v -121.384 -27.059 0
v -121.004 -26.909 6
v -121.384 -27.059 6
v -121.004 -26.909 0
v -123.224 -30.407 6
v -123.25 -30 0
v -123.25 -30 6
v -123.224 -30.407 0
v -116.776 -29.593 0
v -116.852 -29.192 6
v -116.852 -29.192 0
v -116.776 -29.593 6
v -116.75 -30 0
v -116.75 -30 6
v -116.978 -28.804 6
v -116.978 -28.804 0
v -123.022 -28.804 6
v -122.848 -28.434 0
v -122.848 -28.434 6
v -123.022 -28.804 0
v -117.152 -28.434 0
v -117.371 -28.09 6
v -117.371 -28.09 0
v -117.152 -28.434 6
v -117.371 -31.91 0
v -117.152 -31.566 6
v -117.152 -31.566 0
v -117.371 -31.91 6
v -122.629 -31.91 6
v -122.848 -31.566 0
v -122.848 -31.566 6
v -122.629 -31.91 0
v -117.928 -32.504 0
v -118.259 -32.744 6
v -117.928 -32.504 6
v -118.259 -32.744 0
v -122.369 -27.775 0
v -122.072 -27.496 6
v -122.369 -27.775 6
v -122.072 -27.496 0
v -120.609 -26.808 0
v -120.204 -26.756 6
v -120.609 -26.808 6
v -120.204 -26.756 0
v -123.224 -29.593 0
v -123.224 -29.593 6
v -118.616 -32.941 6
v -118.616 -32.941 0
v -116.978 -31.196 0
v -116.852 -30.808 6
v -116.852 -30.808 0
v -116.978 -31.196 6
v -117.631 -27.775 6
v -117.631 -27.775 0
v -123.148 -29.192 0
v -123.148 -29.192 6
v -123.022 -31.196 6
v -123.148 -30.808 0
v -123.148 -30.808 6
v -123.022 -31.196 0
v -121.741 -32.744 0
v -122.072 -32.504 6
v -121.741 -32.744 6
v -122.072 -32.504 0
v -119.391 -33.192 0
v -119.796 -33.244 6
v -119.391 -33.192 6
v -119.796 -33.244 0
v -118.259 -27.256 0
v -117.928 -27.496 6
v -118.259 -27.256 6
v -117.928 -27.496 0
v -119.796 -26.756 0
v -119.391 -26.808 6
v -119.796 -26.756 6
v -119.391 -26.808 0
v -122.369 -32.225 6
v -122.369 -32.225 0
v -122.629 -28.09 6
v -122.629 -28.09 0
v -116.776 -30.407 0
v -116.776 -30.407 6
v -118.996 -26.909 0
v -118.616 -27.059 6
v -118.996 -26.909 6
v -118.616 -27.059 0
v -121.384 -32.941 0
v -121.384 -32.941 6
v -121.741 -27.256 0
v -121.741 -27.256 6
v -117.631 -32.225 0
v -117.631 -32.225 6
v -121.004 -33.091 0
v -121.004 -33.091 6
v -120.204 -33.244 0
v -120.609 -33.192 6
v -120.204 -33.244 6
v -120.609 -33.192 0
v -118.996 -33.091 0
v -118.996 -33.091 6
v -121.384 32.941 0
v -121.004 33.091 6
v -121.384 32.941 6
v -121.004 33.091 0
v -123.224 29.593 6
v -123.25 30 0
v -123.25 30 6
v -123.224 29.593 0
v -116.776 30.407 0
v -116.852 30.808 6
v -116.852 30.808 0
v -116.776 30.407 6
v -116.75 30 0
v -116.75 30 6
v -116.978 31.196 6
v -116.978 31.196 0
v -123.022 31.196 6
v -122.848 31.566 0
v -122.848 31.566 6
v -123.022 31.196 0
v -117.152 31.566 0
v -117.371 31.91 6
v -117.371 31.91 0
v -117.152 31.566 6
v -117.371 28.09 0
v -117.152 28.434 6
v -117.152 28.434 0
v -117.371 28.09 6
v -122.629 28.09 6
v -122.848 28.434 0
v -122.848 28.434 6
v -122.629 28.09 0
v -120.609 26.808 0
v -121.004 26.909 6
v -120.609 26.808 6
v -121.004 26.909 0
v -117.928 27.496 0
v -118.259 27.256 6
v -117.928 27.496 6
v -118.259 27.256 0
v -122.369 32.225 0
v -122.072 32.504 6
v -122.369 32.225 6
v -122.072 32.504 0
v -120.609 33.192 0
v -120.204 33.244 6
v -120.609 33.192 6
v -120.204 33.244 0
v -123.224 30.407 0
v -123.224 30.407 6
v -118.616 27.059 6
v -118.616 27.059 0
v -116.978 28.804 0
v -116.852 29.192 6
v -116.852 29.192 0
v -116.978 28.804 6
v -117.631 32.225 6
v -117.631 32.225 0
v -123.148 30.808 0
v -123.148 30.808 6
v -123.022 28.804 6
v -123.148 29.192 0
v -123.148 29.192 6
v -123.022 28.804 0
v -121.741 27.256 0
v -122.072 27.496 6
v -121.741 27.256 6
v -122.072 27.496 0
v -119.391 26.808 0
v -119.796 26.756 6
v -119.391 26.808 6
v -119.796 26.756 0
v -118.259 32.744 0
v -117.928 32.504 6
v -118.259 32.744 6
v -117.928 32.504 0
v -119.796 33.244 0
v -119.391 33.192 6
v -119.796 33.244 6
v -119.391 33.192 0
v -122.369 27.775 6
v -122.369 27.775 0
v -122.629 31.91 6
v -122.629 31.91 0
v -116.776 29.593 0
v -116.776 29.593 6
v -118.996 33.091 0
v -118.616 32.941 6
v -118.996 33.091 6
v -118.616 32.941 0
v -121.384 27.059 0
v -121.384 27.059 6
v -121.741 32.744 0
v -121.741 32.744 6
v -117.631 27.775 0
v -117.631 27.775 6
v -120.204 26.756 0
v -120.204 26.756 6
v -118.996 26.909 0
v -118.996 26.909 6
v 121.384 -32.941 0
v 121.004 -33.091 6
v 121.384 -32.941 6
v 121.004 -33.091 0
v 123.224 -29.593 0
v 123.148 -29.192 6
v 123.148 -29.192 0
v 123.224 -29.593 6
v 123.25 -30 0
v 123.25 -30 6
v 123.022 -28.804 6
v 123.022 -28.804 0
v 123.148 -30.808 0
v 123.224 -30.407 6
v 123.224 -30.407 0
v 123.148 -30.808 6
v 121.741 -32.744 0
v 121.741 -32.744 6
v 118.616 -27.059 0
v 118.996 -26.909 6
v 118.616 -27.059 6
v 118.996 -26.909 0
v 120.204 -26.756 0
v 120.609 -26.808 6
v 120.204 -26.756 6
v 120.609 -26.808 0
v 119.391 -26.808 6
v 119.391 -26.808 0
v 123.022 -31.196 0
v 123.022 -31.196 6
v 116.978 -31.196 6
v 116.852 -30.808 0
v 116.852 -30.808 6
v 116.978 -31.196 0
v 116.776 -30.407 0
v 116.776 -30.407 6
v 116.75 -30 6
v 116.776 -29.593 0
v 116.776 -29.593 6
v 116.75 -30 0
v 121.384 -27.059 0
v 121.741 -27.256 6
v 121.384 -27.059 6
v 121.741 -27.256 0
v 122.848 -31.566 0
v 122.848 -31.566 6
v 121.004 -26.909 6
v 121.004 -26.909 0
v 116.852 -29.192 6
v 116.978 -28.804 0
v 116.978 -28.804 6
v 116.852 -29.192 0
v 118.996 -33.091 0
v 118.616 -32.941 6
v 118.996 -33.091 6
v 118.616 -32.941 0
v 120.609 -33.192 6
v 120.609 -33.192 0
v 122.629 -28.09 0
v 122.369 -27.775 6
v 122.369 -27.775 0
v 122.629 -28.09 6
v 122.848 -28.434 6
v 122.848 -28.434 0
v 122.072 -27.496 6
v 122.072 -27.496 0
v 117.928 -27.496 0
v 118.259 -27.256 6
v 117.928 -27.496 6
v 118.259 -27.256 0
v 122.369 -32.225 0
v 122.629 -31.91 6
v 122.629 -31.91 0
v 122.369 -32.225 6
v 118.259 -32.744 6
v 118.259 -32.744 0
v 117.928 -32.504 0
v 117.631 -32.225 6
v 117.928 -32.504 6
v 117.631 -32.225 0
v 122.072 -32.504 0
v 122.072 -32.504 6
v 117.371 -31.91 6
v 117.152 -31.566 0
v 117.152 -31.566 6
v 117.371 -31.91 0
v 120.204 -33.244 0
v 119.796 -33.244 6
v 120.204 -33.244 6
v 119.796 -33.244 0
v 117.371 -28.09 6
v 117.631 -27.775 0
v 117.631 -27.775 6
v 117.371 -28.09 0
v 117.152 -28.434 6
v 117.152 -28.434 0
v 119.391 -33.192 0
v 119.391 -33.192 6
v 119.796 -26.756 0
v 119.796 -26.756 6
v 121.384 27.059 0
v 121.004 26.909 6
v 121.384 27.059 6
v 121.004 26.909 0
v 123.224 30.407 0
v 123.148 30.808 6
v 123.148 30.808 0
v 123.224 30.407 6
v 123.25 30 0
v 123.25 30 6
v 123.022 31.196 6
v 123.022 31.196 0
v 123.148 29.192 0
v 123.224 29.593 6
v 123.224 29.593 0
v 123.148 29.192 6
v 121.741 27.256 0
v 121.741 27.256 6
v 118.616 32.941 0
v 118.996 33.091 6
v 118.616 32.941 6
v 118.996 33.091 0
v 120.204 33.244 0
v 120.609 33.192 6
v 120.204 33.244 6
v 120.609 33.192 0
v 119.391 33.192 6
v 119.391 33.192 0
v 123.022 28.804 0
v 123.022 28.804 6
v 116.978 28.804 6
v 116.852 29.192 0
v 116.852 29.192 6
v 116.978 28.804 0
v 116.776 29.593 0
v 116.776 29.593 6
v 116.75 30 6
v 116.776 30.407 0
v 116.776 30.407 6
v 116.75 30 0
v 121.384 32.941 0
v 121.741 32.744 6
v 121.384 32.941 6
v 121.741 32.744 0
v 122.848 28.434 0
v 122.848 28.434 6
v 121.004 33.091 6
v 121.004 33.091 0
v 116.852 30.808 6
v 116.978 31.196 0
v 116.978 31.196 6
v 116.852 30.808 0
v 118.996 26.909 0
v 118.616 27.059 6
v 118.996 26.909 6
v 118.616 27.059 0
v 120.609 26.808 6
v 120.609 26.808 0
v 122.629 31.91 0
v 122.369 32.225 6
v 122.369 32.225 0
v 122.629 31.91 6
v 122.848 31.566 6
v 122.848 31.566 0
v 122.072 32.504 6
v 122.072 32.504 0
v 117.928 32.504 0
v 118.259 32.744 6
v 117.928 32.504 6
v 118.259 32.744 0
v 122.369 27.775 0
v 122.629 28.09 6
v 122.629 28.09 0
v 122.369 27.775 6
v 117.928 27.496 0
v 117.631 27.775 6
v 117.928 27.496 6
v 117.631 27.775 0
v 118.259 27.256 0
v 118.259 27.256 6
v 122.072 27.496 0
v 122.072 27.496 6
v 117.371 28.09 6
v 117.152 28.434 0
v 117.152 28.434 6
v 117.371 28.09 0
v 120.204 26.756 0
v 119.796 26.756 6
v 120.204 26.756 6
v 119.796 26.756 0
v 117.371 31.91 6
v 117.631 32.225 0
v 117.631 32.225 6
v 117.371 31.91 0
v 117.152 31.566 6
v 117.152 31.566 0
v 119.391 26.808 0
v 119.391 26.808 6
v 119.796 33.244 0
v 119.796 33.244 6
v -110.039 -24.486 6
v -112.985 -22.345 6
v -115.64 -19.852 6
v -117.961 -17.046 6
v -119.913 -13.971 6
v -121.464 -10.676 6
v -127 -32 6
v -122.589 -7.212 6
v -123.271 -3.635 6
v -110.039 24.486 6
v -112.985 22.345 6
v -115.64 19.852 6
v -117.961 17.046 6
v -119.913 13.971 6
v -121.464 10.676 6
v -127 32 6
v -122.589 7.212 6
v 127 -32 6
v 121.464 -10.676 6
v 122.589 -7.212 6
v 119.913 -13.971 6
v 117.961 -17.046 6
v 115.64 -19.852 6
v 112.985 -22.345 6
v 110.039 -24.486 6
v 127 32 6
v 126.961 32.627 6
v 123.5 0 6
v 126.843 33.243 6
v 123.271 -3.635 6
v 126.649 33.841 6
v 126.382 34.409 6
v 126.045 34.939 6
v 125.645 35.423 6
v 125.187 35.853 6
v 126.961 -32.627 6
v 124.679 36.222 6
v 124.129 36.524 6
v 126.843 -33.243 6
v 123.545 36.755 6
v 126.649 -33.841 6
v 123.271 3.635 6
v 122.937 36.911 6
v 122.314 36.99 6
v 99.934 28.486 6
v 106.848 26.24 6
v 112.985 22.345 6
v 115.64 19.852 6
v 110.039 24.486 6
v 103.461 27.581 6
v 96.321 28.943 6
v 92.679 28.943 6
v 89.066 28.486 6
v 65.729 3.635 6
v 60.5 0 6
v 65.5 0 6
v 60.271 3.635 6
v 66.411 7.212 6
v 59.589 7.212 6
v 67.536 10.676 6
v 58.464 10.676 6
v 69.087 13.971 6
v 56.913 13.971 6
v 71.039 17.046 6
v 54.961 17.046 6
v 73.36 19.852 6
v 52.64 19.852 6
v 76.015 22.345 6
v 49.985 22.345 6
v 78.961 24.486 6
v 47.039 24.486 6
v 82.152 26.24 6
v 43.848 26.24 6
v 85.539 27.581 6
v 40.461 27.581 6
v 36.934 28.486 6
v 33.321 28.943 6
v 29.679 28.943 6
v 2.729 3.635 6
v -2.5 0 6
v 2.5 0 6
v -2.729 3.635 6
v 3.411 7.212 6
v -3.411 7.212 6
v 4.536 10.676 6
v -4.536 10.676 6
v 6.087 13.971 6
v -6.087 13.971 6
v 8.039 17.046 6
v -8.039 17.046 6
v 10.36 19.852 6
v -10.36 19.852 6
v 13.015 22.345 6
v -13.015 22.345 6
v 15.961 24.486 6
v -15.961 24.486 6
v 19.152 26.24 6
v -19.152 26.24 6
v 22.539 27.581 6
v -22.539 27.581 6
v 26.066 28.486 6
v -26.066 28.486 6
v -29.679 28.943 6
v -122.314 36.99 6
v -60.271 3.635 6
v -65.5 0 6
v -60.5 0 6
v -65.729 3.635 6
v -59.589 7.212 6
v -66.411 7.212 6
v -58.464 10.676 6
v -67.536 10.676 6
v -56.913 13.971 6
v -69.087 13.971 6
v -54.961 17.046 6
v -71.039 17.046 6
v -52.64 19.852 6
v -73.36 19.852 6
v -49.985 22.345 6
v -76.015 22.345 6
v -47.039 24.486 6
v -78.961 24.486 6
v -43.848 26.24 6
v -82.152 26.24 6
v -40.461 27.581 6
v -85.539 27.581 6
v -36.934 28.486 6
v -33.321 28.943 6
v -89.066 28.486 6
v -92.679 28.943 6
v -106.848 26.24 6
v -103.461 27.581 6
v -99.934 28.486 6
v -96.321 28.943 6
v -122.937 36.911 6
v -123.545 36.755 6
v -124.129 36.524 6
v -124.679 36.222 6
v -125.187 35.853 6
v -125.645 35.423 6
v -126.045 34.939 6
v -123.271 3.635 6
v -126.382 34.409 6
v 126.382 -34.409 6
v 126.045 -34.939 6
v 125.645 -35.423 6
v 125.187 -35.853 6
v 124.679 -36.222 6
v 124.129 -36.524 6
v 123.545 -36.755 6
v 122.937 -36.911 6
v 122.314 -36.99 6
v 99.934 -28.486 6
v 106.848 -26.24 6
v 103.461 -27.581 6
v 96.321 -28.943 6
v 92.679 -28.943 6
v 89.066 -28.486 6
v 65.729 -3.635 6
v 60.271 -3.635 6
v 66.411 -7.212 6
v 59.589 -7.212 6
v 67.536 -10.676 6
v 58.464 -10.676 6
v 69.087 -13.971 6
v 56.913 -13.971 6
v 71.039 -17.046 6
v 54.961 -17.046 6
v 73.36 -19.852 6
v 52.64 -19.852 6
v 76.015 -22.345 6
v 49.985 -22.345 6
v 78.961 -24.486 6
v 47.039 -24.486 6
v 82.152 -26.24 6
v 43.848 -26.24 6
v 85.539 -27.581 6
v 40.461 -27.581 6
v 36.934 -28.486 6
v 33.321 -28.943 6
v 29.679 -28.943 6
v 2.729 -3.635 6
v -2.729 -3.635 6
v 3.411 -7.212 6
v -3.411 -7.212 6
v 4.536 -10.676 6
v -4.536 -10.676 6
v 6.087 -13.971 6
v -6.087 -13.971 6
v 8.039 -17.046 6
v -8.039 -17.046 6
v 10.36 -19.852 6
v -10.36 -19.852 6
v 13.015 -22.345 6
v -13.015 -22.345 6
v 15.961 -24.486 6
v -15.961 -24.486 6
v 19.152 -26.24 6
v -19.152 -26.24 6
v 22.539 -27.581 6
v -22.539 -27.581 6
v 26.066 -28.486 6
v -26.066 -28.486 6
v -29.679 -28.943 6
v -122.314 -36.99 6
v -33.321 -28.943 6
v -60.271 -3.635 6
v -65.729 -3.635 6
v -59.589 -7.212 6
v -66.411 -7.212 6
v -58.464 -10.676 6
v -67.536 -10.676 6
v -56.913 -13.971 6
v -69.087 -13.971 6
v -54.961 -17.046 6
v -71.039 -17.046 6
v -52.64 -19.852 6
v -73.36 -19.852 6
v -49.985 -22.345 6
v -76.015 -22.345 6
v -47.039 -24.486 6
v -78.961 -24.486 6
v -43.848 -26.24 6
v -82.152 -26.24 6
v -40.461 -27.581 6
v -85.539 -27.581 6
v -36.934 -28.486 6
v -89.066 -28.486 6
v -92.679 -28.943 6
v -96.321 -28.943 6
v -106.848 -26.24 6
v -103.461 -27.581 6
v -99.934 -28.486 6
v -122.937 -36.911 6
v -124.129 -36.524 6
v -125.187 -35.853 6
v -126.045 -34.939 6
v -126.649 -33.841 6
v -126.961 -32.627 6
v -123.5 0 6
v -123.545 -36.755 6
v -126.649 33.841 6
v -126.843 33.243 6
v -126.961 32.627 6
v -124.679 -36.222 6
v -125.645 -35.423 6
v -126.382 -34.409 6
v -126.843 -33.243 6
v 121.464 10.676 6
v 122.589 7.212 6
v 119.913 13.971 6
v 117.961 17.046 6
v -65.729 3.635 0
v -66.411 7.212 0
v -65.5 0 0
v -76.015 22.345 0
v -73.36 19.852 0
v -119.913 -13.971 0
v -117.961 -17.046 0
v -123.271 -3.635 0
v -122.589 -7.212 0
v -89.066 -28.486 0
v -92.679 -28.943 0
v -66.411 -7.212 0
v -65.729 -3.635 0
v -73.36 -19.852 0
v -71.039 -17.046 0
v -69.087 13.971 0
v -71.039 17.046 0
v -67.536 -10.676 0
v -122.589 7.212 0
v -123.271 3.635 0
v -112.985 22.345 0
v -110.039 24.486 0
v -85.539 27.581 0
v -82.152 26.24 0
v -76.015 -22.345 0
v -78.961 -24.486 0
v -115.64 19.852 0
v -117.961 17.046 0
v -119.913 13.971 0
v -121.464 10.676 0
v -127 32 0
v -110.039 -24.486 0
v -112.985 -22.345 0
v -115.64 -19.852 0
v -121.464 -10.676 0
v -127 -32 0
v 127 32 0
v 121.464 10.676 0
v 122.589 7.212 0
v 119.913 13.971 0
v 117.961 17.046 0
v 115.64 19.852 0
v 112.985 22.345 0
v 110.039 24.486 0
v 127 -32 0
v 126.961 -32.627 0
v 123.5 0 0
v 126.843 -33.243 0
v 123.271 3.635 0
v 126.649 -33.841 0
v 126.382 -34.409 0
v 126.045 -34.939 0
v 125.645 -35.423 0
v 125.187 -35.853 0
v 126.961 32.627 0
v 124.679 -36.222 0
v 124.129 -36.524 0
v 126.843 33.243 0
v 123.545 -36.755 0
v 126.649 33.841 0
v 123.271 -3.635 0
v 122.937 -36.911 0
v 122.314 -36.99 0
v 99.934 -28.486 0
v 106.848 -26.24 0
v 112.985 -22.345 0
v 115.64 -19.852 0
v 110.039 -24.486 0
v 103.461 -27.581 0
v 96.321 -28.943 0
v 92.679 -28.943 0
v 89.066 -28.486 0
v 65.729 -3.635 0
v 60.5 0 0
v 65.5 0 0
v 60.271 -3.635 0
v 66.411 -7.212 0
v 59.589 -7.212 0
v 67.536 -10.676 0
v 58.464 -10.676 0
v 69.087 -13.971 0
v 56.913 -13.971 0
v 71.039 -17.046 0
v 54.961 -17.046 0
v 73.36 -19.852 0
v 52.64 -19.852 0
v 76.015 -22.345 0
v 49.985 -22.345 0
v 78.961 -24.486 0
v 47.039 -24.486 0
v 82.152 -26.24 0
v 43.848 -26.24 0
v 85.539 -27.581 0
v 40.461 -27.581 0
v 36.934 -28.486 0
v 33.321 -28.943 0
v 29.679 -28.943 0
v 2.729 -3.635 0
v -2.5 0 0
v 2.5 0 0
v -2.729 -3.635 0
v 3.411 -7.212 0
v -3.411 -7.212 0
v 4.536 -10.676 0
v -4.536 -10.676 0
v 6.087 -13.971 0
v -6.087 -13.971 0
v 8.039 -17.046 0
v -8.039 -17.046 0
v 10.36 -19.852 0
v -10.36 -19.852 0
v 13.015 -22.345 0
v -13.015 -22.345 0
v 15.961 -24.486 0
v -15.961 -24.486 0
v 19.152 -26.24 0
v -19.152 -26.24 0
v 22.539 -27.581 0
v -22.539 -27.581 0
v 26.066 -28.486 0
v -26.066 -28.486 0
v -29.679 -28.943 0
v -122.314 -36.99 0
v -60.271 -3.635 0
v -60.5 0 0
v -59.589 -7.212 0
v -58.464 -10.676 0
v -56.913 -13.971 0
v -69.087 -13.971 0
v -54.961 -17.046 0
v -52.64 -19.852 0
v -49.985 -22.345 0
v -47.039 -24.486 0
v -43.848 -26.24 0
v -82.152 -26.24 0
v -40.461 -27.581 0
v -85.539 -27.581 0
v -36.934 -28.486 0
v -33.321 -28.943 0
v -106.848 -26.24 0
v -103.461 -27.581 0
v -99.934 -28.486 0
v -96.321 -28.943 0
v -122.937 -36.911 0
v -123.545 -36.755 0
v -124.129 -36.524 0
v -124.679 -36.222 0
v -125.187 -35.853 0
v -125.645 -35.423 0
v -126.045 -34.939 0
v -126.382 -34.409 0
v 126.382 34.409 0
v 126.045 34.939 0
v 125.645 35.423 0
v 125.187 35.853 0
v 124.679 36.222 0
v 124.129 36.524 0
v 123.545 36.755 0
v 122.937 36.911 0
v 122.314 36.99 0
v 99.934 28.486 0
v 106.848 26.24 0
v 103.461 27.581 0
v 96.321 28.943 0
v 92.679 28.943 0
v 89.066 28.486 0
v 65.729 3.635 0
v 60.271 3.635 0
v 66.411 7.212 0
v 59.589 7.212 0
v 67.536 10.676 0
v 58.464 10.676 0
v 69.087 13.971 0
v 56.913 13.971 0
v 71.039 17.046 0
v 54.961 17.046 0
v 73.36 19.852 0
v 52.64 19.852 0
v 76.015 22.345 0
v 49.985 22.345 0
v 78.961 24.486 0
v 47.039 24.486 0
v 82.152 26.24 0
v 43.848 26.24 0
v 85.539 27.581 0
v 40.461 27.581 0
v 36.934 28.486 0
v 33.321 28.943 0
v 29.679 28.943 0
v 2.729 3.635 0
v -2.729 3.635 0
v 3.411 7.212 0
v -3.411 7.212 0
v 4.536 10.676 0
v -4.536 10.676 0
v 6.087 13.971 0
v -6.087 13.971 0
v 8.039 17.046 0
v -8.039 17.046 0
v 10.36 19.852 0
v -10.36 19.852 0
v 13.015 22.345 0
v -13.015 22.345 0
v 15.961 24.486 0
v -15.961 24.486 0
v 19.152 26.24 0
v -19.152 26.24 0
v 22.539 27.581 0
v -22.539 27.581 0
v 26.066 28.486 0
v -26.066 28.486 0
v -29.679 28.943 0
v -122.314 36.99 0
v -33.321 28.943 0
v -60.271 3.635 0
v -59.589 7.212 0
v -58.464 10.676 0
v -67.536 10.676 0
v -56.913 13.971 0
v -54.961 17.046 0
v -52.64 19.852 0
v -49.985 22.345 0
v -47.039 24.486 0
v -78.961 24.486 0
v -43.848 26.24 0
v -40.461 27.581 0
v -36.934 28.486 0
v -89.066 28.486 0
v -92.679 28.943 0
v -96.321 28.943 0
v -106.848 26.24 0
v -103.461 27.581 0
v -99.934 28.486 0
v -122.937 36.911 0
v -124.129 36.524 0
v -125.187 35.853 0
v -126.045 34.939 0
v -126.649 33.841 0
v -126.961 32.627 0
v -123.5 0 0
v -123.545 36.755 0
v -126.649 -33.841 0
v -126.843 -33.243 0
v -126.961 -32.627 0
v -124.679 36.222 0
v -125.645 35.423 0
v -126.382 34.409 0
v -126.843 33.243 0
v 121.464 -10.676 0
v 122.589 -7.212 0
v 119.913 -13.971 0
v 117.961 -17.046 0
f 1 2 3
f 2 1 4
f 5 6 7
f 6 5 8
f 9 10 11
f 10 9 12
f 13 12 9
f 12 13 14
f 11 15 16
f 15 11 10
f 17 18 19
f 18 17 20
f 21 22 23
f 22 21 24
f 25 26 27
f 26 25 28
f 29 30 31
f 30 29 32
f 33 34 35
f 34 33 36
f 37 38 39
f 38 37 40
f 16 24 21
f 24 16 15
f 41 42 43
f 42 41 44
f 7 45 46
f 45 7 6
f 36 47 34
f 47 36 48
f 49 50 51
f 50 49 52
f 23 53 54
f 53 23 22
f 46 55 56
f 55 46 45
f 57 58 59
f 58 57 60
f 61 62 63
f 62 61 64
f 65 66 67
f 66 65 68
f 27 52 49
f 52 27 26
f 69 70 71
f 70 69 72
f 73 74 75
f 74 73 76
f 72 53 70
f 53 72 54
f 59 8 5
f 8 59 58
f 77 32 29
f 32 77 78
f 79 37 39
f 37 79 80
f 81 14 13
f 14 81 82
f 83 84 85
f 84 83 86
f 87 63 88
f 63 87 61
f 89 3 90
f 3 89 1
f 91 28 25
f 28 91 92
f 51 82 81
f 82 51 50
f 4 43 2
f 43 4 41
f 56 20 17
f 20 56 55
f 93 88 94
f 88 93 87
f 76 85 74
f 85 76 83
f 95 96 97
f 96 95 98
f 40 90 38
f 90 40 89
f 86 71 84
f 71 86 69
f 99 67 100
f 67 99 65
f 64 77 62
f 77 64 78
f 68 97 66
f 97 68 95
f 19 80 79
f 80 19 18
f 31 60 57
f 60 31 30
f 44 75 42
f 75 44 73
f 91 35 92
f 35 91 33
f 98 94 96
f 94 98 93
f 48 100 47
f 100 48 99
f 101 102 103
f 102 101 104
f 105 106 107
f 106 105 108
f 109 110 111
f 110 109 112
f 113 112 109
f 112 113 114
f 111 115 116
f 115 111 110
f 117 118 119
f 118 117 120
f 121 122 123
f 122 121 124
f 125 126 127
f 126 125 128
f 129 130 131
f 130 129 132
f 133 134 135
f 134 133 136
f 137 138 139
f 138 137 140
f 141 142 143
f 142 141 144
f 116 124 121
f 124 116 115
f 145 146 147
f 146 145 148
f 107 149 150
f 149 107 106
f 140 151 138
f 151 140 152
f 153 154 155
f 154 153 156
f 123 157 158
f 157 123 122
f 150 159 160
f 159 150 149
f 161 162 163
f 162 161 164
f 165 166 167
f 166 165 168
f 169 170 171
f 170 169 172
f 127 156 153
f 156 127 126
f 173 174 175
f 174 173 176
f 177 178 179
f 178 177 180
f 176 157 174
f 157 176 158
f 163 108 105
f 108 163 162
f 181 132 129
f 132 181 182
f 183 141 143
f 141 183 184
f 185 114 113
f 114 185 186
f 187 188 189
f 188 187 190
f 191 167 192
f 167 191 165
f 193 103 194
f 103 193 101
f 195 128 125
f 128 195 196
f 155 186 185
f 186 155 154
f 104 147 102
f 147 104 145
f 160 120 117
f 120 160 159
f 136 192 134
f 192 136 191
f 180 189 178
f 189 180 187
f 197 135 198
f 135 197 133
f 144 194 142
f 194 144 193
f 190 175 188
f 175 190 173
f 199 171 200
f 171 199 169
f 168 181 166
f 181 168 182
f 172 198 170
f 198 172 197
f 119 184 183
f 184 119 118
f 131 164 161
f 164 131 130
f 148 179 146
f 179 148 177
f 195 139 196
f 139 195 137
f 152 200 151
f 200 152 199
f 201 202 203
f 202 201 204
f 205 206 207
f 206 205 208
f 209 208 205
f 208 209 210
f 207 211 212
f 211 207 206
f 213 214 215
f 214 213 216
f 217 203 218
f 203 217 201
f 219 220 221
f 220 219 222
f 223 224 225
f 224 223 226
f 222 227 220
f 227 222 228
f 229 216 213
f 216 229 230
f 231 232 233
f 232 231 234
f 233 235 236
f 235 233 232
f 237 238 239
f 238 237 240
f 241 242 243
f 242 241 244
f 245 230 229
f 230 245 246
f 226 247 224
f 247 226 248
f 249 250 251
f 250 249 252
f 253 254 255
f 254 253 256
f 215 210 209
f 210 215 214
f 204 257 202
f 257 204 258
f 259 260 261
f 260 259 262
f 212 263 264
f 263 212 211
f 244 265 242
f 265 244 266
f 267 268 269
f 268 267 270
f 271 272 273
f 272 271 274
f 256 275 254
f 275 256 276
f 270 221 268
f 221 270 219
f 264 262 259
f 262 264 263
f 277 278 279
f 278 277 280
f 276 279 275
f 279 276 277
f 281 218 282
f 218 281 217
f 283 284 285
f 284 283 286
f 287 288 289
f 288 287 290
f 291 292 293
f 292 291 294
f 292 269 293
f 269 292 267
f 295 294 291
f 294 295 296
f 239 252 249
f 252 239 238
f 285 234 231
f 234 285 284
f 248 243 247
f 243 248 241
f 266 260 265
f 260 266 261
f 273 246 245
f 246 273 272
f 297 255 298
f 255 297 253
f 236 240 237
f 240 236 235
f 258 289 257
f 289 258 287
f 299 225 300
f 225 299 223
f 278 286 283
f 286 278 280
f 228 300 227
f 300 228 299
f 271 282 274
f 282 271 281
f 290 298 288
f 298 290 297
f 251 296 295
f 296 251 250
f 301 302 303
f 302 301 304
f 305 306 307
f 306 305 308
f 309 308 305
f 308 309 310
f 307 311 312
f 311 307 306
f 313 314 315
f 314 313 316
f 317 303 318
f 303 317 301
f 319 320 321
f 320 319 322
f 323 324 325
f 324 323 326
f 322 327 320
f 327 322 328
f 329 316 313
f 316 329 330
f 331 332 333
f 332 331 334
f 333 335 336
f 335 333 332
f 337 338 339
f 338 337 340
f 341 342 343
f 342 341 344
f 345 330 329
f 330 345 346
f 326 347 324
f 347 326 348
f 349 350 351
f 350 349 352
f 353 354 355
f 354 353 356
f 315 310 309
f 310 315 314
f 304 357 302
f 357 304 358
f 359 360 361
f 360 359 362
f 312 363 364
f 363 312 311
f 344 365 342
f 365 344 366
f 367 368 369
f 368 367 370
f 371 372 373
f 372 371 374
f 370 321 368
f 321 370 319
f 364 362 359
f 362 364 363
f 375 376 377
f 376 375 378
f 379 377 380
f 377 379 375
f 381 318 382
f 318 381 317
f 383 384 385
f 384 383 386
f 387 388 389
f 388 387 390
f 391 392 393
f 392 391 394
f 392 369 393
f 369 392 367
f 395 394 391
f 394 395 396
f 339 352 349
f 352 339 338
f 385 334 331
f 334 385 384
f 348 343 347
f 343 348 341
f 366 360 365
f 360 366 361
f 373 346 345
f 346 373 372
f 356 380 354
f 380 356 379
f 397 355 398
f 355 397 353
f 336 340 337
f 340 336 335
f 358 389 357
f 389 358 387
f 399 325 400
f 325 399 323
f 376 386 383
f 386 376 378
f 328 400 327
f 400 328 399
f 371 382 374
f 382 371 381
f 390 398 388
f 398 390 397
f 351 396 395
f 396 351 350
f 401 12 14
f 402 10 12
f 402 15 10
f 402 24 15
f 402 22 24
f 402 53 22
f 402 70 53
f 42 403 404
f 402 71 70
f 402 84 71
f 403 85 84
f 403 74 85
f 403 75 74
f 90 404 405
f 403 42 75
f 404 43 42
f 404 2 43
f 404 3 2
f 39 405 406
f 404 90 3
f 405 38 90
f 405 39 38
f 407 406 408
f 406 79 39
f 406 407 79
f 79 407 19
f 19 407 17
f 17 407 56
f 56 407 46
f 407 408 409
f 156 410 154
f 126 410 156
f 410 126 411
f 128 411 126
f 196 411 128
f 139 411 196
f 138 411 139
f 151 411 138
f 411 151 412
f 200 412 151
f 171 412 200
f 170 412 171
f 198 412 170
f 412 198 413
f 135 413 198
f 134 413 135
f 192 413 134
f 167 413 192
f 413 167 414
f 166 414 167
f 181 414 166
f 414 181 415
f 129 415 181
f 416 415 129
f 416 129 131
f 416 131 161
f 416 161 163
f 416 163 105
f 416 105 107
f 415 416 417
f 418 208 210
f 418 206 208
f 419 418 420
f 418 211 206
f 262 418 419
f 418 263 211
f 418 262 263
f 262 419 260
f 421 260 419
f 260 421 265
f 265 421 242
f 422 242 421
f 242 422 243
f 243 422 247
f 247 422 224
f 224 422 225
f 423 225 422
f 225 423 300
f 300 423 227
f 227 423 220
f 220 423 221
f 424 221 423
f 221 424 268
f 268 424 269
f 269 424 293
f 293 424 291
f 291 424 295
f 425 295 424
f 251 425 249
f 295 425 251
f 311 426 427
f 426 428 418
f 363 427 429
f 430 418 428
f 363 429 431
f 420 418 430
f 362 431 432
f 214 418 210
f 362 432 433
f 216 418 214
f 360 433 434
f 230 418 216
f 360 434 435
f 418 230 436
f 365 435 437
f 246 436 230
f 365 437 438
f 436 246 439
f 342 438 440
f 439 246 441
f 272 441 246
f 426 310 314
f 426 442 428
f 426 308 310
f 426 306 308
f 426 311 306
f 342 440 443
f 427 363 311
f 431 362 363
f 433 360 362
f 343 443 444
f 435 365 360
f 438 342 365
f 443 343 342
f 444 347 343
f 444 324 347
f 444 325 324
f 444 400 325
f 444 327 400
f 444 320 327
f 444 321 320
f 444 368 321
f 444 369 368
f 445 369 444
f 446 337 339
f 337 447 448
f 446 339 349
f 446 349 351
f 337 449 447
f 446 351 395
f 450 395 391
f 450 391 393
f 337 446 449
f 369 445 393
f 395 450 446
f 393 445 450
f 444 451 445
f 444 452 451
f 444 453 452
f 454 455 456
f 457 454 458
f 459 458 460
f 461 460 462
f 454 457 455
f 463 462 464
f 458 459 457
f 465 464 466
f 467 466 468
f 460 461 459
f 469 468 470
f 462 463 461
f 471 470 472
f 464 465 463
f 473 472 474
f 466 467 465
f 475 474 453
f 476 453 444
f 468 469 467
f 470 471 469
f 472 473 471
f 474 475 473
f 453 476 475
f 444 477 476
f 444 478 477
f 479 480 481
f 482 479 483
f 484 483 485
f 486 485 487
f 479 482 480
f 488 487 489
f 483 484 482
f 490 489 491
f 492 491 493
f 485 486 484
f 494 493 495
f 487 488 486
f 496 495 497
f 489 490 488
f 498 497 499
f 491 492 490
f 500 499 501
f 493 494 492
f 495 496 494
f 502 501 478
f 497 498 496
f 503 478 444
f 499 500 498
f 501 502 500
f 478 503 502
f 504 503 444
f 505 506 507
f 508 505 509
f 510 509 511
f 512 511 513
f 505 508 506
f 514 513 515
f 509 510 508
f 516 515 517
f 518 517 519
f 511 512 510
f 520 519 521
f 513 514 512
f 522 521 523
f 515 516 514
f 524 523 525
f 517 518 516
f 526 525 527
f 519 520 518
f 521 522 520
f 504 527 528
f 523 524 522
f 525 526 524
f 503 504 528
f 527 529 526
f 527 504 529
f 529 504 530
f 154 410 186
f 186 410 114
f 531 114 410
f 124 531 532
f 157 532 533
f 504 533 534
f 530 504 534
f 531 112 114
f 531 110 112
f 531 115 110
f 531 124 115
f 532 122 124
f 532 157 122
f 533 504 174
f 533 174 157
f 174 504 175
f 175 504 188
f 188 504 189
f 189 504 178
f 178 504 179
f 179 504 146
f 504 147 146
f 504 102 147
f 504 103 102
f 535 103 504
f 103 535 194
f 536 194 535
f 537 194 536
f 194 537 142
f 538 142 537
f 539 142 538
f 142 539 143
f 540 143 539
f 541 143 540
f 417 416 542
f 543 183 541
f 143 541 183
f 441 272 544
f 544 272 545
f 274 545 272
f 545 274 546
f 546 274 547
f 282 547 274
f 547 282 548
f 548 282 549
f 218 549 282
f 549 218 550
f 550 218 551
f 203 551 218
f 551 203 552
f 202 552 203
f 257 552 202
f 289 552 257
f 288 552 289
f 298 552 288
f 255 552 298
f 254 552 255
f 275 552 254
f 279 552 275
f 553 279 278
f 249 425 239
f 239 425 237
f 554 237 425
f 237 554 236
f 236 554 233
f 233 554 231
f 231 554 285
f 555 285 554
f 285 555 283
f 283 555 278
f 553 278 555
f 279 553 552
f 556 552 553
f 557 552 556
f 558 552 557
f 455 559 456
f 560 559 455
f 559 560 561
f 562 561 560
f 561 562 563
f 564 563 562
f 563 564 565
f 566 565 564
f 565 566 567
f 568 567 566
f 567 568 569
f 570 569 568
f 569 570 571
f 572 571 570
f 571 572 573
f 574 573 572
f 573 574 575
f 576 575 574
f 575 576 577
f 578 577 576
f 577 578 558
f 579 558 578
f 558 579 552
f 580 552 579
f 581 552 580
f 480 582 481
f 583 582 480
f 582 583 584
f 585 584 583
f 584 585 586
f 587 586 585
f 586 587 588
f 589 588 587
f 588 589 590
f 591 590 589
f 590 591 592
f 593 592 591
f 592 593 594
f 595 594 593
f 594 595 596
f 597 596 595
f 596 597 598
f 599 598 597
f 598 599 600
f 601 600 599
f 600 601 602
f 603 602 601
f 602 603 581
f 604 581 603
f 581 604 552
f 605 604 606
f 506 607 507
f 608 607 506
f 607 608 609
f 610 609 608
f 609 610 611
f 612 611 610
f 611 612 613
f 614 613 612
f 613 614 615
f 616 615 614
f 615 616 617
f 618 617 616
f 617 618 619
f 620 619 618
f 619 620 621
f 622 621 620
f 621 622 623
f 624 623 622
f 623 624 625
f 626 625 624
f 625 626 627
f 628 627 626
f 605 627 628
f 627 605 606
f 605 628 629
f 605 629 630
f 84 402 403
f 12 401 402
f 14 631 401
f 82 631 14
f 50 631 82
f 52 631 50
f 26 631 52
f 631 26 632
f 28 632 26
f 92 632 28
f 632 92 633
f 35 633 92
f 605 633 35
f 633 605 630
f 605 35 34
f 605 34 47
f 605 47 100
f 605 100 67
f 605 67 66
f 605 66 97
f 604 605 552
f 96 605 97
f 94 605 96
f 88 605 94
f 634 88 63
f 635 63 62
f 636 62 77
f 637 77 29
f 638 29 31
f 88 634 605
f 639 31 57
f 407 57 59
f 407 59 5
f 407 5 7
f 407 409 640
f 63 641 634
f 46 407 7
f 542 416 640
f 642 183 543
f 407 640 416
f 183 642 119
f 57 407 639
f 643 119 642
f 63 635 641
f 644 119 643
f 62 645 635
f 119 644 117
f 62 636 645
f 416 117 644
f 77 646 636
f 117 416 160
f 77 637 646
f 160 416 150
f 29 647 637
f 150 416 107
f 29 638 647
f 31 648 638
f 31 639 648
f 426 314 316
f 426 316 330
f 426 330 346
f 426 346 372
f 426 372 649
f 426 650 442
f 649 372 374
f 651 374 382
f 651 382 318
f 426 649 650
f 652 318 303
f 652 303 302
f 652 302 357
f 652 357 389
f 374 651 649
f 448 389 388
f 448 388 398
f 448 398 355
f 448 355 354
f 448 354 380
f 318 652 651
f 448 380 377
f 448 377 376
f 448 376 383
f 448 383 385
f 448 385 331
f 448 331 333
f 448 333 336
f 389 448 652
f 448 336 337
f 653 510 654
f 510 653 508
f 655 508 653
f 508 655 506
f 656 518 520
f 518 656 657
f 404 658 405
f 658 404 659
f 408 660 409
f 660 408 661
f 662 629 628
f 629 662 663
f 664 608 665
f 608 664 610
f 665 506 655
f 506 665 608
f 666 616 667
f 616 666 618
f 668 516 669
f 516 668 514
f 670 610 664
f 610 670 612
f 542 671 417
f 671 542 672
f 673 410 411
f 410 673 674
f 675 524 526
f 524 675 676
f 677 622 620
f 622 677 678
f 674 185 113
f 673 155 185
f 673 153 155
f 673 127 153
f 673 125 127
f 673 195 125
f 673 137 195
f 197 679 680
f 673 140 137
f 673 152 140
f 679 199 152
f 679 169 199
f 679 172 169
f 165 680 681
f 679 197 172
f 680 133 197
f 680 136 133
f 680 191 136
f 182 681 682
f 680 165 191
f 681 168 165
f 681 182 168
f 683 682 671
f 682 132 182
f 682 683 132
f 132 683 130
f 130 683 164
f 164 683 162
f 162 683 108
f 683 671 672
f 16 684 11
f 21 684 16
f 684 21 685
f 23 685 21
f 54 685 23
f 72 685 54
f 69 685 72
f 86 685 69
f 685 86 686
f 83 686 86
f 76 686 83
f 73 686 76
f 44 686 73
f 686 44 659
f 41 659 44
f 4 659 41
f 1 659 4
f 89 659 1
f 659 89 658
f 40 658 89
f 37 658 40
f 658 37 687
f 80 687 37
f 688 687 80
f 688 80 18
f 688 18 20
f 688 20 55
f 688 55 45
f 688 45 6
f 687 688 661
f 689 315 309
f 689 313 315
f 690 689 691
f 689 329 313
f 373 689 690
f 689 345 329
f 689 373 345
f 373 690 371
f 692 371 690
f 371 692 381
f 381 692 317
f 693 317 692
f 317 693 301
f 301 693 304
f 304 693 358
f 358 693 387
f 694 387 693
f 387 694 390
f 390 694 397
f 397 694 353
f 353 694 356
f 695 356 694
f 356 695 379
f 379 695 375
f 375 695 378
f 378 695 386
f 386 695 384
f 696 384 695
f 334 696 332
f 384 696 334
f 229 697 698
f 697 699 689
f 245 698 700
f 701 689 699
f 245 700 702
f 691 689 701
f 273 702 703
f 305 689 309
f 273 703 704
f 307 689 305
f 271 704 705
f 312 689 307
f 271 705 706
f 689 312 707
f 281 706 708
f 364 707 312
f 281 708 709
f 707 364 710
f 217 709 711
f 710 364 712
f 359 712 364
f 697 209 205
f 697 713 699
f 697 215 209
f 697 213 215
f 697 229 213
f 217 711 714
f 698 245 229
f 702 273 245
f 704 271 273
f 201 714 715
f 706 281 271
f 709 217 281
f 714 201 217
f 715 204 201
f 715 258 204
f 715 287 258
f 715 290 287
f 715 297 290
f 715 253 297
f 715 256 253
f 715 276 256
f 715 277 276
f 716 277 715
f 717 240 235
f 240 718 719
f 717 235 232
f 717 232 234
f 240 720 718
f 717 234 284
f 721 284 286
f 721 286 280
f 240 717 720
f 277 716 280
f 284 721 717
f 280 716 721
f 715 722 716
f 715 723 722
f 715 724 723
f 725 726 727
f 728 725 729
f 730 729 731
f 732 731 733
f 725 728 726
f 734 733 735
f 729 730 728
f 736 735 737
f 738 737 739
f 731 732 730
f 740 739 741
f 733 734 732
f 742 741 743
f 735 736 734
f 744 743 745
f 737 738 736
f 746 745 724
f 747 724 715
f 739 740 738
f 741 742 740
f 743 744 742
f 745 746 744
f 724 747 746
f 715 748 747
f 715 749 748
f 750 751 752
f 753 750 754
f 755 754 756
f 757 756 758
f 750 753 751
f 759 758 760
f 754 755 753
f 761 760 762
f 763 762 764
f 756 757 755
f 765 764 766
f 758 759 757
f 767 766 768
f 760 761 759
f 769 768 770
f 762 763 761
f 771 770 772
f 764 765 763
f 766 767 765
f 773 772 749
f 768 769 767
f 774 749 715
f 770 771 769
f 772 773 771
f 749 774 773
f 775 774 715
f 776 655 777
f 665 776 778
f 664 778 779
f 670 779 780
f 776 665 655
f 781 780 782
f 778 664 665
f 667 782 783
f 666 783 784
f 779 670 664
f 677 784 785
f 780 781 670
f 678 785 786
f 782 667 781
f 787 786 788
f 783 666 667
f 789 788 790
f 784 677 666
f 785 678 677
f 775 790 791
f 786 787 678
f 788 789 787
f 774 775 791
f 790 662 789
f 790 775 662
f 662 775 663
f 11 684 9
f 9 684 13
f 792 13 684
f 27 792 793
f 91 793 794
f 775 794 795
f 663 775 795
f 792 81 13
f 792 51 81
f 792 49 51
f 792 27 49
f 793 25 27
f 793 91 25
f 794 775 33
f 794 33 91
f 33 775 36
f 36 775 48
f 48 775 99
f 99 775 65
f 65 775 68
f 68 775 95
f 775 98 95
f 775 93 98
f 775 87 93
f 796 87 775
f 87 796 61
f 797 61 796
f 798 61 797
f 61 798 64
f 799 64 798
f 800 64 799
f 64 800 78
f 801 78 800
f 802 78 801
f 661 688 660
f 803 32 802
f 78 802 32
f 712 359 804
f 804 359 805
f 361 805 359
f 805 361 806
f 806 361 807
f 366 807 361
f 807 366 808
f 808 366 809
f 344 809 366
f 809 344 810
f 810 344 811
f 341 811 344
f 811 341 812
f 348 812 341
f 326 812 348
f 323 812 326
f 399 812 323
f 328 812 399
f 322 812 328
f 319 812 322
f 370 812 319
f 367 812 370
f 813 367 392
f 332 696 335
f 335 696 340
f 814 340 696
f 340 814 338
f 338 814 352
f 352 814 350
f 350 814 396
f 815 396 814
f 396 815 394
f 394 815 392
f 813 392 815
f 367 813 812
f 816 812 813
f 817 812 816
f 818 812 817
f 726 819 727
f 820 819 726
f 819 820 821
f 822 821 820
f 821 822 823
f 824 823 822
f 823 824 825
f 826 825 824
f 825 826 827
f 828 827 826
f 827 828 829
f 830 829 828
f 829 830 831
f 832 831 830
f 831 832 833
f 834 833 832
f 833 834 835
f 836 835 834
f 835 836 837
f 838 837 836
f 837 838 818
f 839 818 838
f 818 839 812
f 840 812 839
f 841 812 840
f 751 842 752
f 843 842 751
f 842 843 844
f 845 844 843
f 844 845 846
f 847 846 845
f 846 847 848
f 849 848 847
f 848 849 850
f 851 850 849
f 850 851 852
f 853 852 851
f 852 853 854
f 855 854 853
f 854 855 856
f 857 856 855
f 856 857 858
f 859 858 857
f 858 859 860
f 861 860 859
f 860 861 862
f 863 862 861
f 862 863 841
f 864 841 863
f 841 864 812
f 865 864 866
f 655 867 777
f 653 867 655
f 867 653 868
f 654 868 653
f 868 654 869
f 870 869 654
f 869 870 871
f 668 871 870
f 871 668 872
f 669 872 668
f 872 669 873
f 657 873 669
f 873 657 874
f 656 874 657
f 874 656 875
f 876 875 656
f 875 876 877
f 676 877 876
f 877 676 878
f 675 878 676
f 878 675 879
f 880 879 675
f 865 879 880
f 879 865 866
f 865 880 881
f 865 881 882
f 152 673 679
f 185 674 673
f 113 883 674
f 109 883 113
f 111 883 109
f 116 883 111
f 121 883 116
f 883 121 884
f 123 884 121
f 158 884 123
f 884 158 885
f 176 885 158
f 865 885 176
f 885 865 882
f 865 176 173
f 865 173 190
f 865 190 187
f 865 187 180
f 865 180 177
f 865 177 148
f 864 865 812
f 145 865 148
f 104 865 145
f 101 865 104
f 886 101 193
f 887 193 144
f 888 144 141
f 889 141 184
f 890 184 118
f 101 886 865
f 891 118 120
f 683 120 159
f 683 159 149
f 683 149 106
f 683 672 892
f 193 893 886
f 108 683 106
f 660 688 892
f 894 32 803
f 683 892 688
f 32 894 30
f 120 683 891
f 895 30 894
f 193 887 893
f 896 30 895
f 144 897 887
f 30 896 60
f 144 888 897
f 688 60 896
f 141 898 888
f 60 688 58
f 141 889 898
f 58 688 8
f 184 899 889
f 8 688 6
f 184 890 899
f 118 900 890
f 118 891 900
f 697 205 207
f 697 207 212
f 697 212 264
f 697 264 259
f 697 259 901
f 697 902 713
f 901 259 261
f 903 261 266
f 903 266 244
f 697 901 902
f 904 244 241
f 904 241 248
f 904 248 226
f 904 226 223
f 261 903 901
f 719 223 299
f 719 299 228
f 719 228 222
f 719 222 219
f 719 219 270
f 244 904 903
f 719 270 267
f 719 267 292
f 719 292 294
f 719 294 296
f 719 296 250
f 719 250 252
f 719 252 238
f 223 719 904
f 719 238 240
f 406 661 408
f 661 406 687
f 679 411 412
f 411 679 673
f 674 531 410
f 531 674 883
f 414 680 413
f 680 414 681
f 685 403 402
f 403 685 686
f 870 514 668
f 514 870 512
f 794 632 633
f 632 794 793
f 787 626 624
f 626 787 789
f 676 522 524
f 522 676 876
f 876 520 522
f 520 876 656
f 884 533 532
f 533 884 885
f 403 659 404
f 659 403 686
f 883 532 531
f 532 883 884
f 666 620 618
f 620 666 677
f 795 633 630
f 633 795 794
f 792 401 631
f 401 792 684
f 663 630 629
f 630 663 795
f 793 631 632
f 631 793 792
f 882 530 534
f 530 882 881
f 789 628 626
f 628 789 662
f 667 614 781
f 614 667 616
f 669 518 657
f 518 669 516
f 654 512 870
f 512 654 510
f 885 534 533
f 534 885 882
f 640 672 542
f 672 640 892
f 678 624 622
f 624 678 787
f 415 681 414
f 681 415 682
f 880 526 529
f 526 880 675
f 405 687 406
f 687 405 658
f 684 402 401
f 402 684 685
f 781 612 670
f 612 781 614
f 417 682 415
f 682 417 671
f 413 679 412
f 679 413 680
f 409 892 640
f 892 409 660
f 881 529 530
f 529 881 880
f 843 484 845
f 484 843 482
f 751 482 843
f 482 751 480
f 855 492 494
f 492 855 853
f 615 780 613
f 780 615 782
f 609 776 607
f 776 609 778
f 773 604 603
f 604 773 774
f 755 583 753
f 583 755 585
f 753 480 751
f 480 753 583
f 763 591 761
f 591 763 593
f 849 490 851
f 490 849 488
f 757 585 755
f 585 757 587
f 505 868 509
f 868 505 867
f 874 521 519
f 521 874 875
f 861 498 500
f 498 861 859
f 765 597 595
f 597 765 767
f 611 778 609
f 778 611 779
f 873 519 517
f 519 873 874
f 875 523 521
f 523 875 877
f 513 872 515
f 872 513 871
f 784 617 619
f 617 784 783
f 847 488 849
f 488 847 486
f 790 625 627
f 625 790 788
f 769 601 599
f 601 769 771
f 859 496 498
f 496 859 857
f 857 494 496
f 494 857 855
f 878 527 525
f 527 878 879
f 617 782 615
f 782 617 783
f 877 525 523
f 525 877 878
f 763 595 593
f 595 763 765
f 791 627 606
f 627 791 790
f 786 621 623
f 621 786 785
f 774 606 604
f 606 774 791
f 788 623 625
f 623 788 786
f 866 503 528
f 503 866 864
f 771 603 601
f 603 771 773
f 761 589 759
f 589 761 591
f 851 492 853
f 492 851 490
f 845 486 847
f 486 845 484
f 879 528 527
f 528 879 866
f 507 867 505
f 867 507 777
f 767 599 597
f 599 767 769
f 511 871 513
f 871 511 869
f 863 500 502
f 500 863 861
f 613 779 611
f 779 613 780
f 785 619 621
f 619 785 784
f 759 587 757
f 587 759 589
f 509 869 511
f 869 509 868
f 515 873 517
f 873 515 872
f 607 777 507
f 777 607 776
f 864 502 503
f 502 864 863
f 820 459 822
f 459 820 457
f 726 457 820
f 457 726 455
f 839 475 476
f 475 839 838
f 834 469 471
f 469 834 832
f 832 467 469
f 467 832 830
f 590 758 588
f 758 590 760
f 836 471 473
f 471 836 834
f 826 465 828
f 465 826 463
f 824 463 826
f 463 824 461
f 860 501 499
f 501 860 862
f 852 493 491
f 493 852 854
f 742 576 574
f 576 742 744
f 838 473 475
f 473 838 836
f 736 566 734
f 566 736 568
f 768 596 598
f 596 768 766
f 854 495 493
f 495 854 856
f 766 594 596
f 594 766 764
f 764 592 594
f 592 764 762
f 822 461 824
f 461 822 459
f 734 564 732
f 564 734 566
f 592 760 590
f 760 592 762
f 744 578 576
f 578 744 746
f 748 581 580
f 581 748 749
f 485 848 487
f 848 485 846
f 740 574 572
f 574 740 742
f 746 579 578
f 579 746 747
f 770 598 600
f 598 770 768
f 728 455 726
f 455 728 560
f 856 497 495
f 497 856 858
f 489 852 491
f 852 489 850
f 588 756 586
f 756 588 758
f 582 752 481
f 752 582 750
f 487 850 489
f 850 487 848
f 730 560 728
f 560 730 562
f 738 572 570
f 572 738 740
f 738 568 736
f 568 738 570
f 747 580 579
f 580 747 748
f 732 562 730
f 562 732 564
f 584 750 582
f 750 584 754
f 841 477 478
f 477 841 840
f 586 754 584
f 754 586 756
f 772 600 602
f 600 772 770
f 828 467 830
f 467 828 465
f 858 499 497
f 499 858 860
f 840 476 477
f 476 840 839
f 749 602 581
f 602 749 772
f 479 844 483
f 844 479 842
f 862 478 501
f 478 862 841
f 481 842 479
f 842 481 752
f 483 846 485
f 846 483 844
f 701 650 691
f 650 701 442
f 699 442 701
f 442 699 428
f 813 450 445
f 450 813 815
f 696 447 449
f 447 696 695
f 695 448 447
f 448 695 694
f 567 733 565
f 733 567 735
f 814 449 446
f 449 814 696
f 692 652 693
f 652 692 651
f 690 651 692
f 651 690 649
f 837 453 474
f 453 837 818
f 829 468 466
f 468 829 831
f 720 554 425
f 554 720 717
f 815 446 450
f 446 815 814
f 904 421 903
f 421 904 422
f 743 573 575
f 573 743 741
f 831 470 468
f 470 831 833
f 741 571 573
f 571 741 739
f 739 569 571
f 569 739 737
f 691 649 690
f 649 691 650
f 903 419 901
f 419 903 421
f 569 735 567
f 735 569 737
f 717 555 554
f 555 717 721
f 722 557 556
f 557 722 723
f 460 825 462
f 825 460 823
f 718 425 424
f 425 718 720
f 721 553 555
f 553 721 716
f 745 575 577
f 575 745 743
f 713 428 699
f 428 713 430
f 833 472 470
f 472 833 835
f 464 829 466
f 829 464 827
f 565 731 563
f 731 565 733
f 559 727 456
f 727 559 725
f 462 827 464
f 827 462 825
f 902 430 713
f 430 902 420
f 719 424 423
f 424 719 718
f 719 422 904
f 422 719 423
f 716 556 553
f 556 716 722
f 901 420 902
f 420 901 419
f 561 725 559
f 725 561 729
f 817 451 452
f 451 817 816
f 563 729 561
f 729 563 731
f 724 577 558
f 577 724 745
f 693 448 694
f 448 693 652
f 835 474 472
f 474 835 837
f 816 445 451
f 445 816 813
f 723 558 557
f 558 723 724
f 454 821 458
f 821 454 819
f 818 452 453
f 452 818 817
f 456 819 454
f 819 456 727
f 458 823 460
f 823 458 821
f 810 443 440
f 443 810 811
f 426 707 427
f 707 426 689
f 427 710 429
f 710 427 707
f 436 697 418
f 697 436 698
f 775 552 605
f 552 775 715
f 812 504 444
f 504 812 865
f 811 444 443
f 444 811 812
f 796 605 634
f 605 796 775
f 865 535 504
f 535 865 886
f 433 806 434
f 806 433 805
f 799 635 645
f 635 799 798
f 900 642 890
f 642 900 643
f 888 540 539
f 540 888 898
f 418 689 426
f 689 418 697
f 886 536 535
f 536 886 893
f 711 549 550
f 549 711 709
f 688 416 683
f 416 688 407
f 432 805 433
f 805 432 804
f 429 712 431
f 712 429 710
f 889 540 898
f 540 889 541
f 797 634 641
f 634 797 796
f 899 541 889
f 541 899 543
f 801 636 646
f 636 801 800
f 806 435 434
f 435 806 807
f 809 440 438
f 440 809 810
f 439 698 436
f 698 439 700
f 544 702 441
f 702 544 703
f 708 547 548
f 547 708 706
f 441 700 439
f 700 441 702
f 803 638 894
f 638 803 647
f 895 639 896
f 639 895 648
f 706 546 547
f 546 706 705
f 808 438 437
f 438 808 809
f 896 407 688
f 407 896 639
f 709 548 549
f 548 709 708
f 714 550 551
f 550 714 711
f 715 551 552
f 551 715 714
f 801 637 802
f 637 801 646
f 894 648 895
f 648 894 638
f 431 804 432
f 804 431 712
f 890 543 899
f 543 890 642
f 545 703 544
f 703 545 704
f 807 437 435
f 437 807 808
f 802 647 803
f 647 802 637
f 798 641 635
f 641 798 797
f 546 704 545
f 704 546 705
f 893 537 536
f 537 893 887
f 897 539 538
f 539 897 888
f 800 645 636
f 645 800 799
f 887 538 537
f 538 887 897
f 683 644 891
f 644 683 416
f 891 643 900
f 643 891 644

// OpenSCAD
$fn = 50;


difference() {
	union() {
		hull() {
			translate(v = [-122.0000000000, 32.0000000000, 0]) {
				cylinder(h = 6, r = 5);
			}
			translate(v = [122.0000000000, 32.0000000000, 0]) {
				cylinder(h = 6, r = 5);
			}
			translate(v = [-122.0000000000, -32.0000000000, 0]) {
				cylinder(h = 6, r = 5);
			}
			translate(v = [122.0000000000, -32.0000000000, 0]) {
				cylinder(h = 6, r = 5);
			}
		}
	}
	union() {
		#translate(v = [-120.0000000000, -30.0000000000, -100.0000000000]) {
			cylinder(h = 200, r = 3.2500000000);
		}
		#translate(v = [-120.0000000000, 30.0000000000, -100.0000000000]) {
			cylinder(h = 200, r = 3.2500000000);
		}
		#translate(v = [120.0000000000, -30.0000000000, -100.0000000000]) {
			cylinder(h = 200, r = 3.2500000000);
		}
		#translate(v = [120.0000000000, 30.0000000000, -100.0000000000]) {
			cylinder(h = 200, r = 3.2500000000);
		}
		#translate(v = [-94.5000000000, 0, 0]) {
			cylinder(h = 6, r = 29.0000000000);
		}
		#translate(v = [-31.5000000000, 0, 0]) {
			cylinder(h = 6, r = 29.0000000000);
		}
		#translate(v = [31.5000000000, 0, 0]) {
			cylinder(h = 6, r = 29.0000000000);
		}
		#translate(v = [94.5000000000, 0, 0]) {
			cylinder(h = 6, r = 29.0000000000);
		}
	}
}
